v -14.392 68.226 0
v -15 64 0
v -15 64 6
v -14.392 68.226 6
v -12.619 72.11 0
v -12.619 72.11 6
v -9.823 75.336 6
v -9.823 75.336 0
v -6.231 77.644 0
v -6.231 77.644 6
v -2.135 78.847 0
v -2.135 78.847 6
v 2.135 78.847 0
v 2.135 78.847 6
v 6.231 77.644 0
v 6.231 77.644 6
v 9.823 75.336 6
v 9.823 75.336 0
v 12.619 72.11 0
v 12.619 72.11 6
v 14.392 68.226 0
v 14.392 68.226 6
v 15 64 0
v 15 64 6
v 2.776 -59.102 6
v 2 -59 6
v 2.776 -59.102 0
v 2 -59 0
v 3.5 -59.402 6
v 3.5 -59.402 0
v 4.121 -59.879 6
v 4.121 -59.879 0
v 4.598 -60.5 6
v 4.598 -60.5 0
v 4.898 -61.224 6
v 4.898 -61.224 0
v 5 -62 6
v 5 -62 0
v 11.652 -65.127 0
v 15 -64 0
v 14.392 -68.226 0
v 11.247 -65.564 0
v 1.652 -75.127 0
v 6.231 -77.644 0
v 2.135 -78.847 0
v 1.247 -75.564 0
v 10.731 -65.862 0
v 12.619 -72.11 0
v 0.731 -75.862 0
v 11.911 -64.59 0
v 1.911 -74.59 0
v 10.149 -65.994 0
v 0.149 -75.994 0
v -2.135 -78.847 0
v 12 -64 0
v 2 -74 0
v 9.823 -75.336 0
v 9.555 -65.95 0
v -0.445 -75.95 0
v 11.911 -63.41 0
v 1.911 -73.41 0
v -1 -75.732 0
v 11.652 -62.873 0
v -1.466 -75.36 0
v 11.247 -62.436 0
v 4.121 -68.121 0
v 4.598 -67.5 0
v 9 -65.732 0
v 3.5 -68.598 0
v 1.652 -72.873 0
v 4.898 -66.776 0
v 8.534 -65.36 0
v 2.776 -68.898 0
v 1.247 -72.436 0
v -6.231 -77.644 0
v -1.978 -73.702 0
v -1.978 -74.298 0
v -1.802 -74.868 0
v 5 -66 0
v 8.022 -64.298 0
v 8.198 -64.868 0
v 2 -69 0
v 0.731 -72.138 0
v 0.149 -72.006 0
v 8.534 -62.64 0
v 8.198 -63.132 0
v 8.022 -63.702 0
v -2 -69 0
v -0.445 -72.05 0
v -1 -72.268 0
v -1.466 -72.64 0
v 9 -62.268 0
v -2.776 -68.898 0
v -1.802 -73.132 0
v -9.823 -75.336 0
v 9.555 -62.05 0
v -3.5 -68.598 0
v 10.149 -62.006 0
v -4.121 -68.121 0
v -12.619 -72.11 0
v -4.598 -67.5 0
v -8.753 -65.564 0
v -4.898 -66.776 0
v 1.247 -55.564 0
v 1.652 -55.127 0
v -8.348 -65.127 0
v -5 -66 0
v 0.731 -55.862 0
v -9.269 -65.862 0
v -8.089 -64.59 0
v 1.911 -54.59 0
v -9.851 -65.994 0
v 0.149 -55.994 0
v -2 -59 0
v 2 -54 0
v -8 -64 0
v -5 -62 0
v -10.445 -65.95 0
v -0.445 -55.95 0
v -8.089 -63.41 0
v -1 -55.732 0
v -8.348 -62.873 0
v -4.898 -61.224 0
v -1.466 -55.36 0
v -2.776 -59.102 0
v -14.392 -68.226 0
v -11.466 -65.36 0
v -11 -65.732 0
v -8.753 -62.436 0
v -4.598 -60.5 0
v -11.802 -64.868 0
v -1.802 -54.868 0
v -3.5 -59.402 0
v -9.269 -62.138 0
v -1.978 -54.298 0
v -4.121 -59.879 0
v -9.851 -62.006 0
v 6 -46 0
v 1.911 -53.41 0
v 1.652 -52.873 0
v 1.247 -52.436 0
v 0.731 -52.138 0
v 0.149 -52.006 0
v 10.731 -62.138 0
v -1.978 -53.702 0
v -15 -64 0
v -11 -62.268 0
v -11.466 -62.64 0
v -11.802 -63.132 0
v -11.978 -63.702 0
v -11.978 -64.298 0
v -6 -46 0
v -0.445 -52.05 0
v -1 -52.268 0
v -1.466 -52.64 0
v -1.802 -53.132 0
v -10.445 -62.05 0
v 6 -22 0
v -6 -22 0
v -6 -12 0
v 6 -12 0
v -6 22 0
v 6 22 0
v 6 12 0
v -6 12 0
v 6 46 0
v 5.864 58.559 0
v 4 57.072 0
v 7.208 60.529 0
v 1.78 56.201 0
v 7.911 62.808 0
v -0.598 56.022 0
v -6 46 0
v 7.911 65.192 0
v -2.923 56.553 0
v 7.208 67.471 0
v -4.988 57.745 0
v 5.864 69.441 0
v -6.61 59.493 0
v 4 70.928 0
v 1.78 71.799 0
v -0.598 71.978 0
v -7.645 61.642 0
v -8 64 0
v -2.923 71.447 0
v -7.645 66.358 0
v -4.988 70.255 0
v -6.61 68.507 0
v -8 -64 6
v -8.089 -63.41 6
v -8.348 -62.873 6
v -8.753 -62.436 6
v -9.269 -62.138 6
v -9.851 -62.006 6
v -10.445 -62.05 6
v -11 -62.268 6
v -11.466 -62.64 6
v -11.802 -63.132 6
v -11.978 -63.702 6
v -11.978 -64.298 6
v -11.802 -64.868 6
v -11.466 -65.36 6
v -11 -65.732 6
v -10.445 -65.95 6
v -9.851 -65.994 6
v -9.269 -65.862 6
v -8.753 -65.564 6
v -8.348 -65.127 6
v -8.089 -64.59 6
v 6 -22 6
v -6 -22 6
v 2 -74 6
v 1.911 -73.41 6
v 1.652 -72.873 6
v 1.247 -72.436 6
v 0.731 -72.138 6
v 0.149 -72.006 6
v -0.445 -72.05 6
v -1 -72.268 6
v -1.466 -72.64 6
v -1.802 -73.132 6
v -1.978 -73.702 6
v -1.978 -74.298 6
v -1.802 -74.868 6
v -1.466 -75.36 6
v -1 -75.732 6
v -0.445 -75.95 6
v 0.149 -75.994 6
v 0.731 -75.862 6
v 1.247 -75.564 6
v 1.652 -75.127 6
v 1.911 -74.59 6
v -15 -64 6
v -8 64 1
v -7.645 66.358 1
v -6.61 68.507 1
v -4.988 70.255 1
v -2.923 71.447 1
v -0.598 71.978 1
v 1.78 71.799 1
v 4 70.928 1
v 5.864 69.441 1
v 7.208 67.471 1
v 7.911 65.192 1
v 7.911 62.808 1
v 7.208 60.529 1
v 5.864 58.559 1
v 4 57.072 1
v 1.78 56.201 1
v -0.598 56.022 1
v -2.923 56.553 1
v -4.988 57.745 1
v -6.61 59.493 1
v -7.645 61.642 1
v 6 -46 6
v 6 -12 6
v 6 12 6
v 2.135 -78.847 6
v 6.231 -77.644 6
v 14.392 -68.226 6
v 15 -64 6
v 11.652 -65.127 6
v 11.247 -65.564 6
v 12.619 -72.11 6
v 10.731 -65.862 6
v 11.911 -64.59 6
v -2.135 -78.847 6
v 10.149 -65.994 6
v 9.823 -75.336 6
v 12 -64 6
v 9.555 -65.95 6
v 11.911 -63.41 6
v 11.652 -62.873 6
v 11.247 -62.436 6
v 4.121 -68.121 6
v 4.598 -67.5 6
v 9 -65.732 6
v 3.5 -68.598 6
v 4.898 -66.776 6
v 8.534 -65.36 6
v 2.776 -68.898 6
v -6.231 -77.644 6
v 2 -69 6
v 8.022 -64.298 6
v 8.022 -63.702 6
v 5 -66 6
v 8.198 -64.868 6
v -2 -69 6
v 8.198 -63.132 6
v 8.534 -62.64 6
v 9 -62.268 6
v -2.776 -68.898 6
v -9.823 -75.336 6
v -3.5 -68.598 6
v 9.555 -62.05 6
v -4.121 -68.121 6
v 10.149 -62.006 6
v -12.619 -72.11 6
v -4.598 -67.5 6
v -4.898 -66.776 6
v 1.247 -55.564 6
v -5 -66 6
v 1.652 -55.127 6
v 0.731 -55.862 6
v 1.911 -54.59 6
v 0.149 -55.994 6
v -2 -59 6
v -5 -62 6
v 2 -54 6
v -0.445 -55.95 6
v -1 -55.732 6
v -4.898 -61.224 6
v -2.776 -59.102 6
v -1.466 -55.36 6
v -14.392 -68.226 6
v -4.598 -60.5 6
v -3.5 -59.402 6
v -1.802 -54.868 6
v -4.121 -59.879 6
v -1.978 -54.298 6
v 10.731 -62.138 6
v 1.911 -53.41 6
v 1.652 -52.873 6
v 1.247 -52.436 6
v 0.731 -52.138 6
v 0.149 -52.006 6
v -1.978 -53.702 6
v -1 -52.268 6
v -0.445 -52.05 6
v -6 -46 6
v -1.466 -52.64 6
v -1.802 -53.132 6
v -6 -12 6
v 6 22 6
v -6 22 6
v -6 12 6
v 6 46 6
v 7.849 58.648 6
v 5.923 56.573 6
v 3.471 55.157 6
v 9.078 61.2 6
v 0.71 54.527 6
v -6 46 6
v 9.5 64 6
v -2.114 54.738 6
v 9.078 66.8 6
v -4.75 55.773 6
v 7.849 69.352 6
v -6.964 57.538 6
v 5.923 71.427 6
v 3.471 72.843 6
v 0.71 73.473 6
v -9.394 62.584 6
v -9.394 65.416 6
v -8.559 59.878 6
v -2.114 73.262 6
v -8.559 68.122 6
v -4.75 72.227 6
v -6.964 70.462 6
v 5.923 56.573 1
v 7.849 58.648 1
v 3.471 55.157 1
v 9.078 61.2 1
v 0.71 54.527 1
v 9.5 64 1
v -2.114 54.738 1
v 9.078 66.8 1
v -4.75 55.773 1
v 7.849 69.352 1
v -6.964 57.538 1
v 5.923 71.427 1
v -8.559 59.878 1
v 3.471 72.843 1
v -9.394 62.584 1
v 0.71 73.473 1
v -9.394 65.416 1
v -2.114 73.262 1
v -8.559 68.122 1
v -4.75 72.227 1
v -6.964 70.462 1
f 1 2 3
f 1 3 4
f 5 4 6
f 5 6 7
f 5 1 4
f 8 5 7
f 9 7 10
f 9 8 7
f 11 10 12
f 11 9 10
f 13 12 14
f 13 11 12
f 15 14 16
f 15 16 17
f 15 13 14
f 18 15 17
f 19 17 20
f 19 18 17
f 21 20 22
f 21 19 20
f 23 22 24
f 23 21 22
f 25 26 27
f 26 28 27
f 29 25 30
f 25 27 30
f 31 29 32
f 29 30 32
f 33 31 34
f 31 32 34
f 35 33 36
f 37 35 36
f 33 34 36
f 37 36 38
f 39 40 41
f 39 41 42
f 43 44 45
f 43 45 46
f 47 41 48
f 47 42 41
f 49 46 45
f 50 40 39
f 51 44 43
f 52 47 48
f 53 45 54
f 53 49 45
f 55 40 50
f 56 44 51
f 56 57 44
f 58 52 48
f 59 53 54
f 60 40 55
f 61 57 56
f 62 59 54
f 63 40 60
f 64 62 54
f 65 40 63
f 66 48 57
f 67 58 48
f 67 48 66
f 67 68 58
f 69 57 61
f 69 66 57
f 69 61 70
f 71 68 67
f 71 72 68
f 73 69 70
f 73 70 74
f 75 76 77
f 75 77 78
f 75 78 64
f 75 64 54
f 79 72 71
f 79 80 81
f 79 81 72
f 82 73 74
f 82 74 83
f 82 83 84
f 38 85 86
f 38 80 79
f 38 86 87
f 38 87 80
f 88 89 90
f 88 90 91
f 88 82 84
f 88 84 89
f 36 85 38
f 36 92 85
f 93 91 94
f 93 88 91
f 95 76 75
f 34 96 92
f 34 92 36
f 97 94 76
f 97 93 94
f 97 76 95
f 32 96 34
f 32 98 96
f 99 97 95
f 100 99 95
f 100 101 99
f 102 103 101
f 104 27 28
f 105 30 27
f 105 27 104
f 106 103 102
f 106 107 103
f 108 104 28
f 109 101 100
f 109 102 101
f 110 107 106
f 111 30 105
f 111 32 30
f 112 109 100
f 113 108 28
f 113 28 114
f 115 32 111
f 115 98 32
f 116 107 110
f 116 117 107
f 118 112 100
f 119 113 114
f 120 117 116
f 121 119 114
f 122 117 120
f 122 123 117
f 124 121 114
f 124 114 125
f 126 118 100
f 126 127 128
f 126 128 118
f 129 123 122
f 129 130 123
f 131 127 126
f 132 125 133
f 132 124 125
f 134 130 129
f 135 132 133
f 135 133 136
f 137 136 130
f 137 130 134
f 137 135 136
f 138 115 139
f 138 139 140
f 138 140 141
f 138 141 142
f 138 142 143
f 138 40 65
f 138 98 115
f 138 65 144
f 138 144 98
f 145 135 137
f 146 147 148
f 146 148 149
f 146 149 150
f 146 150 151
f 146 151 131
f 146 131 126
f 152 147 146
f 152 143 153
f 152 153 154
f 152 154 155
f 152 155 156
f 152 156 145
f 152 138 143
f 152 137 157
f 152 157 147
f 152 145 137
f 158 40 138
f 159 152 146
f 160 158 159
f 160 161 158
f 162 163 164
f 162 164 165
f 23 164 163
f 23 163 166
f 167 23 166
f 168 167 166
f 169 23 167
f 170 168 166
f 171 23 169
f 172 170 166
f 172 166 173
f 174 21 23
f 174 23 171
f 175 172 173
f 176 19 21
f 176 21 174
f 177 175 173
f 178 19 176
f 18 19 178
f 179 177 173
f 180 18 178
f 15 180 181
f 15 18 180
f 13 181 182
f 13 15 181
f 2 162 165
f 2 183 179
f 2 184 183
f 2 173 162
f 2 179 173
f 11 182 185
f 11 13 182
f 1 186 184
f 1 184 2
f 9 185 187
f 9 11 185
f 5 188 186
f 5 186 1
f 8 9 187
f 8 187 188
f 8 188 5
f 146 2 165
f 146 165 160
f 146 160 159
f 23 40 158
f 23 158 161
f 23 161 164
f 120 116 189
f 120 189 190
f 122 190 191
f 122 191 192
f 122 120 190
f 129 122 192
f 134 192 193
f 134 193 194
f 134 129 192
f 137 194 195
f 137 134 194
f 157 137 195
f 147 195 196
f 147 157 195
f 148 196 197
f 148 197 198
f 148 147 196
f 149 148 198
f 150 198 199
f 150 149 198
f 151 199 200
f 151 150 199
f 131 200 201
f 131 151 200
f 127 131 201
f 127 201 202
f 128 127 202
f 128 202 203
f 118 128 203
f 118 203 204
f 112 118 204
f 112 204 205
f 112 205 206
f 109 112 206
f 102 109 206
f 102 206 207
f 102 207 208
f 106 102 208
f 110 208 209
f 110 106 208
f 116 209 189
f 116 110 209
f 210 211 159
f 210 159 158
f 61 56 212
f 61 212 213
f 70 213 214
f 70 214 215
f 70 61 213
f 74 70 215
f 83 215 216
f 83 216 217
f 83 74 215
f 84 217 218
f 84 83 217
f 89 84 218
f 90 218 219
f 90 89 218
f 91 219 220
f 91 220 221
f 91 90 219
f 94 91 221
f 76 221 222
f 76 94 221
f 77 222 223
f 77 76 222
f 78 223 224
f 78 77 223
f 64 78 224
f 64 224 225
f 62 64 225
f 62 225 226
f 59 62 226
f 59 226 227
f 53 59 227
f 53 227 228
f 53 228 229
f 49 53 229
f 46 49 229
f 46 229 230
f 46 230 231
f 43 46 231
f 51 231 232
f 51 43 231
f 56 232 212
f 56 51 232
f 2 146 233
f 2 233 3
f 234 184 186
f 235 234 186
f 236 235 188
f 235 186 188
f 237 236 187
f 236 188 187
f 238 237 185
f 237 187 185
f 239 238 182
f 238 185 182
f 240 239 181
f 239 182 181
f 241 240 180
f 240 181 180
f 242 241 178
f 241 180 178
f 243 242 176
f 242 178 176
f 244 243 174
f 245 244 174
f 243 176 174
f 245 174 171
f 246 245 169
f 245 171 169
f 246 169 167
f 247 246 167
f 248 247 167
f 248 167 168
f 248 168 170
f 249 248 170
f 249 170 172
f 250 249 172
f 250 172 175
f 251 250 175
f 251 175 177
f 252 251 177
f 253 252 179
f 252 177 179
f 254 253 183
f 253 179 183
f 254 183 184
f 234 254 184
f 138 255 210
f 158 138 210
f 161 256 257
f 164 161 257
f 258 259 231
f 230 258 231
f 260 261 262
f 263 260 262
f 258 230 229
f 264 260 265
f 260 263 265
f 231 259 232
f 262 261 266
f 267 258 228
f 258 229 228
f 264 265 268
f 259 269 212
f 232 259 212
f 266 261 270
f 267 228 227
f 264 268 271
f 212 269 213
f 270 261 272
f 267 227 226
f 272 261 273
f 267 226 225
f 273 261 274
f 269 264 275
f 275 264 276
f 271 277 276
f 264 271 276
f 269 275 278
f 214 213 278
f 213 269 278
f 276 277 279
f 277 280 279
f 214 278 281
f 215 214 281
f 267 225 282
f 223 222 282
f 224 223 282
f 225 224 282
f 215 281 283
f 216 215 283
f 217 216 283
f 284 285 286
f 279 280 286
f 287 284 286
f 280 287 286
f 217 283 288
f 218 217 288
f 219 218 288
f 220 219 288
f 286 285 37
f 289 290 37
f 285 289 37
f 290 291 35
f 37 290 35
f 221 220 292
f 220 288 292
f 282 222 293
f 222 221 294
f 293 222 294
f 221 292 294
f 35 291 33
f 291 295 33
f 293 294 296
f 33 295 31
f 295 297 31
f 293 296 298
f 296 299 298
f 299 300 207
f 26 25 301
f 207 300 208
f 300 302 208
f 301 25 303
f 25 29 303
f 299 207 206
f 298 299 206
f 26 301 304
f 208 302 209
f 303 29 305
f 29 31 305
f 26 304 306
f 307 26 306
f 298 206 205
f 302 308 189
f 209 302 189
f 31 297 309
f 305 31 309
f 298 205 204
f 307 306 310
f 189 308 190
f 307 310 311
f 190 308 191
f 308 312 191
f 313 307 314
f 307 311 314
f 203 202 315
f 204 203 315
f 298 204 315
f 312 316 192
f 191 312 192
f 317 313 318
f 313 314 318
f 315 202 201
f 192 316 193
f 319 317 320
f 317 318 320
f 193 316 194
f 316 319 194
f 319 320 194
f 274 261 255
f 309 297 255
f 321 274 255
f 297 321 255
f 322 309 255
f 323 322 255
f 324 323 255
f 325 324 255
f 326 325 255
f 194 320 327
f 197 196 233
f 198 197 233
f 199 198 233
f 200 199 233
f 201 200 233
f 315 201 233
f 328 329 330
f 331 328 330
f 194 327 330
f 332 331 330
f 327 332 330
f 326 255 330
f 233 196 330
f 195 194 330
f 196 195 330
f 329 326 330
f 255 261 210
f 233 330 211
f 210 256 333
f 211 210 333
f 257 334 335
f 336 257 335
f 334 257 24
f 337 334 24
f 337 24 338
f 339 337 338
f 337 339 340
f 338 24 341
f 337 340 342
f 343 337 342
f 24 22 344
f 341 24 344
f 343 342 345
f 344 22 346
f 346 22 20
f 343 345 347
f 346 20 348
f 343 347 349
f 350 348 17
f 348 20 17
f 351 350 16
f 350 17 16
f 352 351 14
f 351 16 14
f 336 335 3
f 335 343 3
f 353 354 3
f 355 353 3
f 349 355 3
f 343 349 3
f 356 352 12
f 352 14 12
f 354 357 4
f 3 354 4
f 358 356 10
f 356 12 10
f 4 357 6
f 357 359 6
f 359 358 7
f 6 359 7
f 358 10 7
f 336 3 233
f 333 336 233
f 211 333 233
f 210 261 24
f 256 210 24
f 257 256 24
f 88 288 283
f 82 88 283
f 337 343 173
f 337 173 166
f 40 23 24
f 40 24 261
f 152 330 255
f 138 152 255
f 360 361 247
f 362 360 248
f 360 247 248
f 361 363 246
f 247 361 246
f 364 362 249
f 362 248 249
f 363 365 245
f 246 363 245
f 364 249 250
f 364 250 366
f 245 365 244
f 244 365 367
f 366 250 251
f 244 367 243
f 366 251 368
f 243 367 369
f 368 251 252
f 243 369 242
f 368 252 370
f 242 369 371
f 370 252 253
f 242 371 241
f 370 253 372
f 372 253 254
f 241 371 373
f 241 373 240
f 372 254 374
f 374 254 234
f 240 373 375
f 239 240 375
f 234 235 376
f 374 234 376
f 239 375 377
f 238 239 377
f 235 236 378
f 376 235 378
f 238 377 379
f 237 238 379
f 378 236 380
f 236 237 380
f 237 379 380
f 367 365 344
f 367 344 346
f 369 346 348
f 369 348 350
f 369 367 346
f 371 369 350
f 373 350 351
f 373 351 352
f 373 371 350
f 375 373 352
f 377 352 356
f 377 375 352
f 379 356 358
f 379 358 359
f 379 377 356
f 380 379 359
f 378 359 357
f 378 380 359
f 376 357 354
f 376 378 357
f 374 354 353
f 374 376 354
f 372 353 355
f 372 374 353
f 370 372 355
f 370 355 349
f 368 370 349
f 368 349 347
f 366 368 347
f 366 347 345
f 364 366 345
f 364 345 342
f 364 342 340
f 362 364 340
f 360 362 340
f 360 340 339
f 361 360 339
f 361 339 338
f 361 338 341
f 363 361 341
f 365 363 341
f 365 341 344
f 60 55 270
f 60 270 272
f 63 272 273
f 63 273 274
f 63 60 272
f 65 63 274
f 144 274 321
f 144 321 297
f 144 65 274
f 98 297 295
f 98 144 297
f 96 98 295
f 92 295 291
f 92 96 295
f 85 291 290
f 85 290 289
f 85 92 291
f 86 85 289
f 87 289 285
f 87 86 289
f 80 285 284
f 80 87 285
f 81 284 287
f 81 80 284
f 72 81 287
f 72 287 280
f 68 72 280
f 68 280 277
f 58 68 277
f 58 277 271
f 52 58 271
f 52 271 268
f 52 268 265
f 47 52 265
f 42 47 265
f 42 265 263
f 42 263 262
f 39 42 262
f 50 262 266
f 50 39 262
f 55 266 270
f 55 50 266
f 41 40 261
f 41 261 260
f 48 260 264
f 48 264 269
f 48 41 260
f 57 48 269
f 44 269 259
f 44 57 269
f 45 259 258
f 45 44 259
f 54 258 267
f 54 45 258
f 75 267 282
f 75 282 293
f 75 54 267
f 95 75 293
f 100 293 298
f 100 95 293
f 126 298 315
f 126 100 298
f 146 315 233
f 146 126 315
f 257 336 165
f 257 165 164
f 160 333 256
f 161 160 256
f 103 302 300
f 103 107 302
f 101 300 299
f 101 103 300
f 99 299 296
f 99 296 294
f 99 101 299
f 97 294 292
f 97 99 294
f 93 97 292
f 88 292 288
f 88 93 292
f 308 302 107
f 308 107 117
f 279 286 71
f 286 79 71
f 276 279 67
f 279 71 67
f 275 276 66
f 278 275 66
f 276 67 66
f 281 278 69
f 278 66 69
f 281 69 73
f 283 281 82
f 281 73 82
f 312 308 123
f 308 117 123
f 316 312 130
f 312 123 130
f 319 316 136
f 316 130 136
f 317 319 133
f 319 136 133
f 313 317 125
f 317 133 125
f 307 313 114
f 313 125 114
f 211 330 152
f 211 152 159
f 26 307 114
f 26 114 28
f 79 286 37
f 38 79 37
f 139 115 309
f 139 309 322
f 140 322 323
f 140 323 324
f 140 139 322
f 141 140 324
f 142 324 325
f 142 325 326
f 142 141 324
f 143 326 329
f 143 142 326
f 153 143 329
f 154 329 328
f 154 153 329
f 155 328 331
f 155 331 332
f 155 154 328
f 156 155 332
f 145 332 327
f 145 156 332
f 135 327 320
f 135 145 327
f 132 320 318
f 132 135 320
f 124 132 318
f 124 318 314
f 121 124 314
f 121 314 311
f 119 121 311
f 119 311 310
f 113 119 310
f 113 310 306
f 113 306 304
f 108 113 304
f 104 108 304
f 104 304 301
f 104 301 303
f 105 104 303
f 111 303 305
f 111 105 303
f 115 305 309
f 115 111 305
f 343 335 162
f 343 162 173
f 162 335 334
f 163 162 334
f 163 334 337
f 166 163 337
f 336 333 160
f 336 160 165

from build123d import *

# Parameters (mm, degrees)
SKETCH_1_R          = 9.5
SKETCH_1_R_2        = 2
EXTRUDE_1_DEPTH     = 6
SKETCH_2_W          = 12
SKETCH_2_H          = 24
SKETCH_2_W_2        = 10
SKETCH_2_H_2        = 10
CUT_EXTRUDE_1_DEPTH = 6
FILLET_1_R          = 3
SKETCH_3_R          = 9.5
SKETCH_3_R_2        = 8
EXTRUDE_3_DEPTH     = 1


with BuildPart() as part:
    # 草图1 → 凸台-拉伸1 (new body)
    with BuildSketch(Plane.XY):
        with BuildLine():
            Line((-15, -64), (-15, 64))
            ThreePointArc((-15, 64), (0, 79), (15, 64))
            Line((15, 64), (15, -64))
            ThreePointArc((15, -64), (0, -79), (-15, -64))
        make_face()
        with Locations((0, 64)):
            Circle(SKETCH_1_R, mode=Mode.SUBTRACT)
        with Locations((0, -54)):
            Circle(SKETCH_1_R_2, mode=Mode.SUBTRACT)
        with Locations((10, -64)):
            Circle(SKETCH_1_R_2, mode=Mode.SUBTRACT)
        with Locations((0, -74)):
            Circle(SKETCH_1_R_2, mode=Mode.SUBTRACT)
        with Locations((-10, -64)):
            Circle(SKETCH_1_R_2, mode=Mode.SUBTRACT)
    extrude(amount=EXTRUDE_1_DEPTH)

    # 草图2 → 切除-拉伸1 (cut)
    with BuildSketch(Plane.XY.offset(6)):
        with Locations((0, 34)):
            Rectangle(SKETCH_2_W, SKETCH_2_H)
        Rectangle(SKETCH_2_W, SKETCH_2_H)
        with Locations((0, -34)):
            Rectangle(SKETCH_2_W, SKETCH_2_H)
        with Locations((0, -64)):
            Rectangle(SKETCH_2_W_2, SKETCH_2_H_2)
    extrude(amount=-CUT_EXTRUDE_1_DEPTH, mode=Mode.SUBTRACT)

    # 圆角1
    fillet_1_edges = [part.edges().sort_by_distance(p)[0] for p in [
        (5, -59, 3),
        (5, -69, 3),
        (-5, -69, 3),
        (-5, -59, 3),
    ]]
    fillet(fillet_1_edges, radius=FILLET_1_R)

    # 草图3 → 凸台-拉伸3 (add)
    with BuildSketch(Plane(origin=(0, 0, 0), x_dir=(-1, 0, 0), z_dir=(0, 0, -1))):
        with Locations((0, 64)):
            Circle(SKETCH_3_R)
        with Locations((0, 64)):
            Circle(SKETCH_3_R_2, mode=Mode.SUBTRACT)
    extrude(amount=-EXTRUDE_3_DEPTH)


solid = part.part
